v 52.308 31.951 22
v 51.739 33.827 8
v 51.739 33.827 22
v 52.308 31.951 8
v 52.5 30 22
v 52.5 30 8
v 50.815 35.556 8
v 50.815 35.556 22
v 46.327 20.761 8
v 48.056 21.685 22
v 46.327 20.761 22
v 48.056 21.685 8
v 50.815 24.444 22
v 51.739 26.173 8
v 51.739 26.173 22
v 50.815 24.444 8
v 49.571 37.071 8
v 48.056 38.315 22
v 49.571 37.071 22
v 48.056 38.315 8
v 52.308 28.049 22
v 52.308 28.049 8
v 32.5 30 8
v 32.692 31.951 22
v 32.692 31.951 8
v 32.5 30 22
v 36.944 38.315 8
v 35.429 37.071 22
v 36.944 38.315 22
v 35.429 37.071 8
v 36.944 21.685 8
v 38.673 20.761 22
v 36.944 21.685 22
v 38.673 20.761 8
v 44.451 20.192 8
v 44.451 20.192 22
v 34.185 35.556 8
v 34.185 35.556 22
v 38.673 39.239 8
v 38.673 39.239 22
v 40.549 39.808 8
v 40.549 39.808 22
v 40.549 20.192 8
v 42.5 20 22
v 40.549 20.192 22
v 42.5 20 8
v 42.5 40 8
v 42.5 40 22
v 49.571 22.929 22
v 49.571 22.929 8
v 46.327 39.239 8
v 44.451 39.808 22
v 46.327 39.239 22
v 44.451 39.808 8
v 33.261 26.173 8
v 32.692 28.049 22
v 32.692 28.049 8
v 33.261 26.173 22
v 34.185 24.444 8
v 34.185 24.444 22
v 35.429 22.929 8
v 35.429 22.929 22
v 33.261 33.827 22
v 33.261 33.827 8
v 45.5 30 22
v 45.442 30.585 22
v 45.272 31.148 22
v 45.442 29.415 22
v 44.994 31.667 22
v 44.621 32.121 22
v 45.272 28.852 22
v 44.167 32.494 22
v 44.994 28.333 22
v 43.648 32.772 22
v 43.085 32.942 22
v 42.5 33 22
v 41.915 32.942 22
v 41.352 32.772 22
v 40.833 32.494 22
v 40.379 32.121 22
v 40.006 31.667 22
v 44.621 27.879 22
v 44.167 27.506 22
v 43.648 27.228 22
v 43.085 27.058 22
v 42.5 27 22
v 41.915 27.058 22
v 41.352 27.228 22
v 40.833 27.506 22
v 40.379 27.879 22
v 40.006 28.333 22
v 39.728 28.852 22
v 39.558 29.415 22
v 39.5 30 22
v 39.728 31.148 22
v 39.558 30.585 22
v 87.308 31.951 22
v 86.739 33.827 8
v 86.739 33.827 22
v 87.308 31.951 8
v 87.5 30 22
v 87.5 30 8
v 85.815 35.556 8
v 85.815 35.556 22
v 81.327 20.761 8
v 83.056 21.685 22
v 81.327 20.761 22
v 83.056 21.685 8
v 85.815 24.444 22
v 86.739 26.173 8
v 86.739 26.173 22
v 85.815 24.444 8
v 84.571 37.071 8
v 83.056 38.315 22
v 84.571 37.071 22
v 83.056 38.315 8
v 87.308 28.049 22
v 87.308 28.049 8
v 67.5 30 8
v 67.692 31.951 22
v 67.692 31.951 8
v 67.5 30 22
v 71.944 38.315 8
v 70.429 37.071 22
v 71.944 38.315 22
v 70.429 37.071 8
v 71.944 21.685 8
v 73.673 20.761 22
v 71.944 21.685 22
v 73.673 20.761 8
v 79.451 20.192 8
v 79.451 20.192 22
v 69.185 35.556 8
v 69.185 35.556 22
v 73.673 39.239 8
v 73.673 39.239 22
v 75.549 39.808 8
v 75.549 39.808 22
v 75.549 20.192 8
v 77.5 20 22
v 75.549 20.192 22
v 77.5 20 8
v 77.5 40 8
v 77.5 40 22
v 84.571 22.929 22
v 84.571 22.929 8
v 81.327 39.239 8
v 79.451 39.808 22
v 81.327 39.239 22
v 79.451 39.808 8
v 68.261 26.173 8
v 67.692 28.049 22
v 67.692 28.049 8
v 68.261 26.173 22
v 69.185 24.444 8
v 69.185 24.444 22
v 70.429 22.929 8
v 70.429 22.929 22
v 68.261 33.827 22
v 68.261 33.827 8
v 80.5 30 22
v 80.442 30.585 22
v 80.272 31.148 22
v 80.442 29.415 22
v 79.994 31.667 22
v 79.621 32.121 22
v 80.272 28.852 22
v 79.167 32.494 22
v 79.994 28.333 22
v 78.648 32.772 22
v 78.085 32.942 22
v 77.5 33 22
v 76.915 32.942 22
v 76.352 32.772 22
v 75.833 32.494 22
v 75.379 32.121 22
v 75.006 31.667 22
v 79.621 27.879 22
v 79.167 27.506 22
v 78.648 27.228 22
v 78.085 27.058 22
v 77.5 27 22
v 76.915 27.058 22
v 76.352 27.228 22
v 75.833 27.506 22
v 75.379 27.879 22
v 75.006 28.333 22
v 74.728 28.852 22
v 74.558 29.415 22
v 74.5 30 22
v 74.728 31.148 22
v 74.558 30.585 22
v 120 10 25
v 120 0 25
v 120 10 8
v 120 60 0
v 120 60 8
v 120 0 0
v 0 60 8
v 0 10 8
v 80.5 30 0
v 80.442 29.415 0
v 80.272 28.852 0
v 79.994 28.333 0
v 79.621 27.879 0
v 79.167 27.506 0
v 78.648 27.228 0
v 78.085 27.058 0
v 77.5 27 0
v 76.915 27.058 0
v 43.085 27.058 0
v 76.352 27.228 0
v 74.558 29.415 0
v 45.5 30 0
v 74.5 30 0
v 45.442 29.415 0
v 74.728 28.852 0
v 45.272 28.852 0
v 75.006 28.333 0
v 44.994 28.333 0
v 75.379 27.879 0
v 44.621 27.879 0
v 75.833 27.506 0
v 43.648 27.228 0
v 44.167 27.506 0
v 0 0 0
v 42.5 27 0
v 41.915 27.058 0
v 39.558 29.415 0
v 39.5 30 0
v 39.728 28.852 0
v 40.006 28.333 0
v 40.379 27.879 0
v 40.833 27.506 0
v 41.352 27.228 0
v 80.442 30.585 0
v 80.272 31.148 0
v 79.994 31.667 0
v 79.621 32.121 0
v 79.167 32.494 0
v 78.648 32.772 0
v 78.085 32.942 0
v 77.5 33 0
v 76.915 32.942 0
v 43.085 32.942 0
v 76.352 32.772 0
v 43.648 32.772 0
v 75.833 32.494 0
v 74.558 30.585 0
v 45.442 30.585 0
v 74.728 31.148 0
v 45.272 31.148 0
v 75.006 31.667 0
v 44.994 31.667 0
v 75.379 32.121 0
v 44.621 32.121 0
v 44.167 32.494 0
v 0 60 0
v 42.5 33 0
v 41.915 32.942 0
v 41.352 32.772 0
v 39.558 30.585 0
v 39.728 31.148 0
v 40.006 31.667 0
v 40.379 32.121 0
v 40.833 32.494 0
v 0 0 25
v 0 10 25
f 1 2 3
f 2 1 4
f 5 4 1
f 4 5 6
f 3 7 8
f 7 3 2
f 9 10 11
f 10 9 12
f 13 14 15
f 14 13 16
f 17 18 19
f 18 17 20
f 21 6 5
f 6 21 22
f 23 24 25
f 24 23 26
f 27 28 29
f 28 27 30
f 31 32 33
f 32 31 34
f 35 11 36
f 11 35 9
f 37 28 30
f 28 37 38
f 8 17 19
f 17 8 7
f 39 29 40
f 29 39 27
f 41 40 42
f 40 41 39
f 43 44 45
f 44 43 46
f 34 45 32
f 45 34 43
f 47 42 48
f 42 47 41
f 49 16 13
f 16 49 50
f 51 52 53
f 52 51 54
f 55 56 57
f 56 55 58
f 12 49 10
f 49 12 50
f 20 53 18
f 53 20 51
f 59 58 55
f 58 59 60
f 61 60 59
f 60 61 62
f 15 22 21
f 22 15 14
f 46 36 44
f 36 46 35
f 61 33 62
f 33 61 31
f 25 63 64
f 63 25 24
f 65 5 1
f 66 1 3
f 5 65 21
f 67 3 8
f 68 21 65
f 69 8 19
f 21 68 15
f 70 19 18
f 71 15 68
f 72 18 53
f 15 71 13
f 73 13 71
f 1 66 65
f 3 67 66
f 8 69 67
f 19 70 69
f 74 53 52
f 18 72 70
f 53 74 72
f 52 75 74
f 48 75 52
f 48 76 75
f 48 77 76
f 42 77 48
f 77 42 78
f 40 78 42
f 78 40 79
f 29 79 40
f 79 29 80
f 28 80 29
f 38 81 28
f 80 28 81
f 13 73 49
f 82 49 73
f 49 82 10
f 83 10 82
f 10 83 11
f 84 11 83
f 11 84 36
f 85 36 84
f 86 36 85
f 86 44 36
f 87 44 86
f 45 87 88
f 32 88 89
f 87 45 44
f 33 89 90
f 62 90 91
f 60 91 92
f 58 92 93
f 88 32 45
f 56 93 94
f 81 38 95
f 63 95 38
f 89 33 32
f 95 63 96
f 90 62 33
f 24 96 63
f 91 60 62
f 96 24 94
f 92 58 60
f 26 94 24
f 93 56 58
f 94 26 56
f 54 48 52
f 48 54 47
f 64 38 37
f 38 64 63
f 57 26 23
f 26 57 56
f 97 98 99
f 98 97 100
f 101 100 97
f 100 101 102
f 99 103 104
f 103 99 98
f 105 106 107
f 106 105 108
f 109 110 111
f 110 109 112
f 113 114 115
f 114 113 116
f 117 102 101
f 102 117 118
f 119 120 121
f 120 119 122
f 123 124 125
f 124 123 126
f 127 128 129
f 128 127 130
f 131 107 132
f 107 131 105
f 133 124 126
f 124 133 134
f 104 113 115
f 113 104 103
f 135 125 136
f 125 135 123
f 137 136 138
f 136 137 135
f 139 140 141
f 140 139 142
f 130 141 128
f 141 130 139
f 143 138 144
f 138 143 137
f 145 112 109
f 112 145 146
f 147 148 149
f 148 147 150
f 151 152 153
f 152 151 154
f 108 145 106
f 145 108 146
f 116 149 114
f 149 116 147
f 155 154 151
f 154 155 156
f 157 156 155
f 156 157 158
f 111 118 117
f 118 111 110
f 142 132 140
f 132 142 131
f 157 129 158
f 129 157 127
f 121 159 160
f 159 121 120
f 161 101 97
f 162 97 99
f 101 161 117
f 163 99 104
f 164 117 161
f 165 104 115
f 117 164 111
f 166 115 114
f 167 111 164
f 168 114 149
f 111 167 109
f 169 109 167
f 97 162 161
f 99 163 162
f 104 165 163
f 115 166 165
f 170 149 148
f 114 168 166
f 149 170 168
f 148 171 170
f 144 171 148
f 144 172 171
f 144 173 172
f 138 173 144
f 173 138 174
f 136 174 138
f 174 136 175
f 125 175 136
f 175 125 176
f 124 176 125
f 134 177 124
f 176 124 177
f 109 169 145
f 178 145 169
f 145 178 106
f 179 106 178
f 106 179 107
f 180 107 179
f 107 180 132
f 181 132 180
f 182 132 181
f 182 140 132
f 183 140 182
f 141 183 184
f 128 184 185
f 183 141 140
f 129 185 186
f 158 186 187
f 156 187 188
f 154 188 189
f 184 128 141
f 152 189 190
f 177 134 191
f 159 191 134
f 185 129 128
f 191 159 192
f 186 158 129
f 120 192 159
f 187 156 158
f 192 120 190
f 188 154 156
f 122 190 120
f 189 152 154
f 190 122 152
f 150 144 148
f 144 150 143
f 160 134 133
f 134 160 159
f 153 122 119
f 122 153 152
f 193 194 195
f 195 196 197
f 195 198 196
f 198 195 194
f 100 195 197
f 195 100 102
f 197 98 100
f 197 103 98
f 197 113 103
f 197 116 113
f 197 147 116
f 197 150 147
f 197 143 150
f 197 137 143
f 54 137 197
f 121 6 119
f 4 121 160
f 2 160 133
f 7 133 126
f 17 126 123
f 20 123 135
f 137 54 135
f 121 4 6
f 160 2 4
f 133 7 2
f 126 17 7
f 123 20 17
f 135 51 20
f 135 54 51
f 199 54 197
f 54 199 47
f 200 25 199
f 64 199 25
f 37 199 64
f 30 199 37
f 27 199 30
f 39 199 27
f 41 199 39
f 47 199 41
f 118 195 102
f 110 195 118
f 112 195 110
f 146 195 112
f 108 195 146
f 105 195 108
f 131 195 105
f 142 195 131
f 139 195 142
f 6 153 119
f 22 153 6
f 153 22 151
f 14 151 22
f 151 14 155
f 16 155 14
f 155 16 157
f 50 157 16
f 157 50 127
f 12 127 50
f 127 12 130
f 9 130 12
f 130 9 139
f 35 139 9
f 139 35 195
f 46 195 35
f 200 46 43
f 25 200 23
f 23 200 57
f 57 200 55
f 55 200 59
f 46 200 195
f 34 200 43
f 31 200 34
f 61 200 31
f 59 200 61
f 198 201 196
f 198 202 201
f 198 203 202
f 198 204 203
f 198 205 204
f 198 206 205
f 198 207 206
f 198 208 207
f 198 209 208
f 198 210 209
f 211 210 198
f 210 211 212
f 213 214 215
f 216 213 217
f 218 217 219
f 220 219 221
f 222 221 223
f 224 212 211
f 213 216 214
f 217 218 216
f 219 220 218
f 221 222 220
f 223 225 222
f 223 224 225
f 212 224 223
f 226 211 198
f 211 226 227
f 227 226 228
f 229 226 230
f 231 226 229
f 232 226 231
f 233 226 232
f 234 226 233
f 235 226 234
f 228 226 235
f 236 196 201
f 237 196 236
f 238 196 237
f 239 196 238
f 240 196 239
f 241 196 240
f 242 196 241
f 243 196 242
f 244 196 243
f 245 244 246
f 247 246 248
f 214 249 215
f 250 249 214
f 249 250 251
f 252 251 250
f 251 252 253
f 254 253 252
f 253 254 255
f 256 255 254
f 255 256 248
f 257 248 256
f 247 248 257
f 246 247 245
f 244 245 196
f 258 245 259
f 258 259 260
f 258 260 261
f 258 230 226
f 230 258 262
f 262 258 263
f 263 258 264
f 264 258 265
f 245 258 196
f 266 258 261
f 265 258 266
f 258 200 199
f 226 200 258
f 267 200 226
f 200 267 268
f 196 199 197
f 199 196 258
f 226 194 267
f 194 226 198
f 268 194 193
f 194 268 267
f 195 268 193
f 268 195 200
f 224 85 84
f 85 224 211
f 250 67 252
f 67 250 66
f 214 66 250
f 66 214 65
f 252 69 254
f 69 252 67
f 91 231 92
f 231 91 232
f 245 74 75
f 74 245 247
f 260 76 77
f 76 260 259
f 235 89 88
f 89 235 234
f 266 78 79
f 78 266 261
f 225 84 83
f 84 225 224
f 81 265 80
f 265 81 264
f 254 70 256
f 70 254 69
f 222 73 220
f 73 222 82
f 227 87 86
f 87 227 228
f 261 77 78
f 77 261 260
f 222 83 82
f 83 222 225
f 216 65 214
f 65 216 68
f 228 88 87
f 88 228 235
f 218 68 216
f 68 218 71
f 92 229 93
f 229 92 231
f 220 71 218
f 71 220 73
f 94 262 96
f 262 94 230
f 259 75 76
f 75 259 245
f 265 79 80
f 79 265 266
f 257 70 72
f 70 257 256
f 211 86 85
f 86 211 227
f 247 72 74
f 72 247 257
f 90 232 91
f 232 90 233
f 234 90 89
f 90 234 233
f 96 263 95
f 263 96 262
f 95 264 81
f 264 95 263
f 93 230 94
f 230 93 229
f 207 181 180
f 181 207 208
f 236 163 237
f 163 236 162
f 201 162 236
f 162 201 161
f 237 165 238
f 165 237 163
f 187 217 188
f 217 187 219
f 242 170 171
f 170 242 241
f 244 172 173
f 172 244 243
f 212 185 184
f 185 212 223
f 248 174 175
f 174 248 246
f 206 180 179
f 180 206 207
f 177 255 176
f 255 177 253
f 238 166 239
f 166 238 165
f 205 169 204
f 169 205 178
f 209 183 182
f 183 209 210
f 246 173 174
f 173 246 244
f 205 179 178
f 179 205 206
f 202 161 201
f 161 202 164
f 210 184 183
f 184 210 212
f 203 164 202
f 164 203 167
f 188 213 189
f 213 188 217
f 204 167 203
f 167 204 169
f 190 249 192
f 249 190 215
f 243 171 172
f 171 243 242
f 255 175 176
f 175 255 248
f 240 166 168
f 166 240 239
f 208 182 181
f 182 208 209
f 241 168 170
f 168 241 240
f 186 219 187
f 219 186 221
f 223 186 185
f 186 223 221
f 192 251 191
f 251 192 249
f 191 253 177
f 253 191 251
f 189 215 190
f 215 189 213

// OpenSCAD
$fn = 32;

// ----------------------------------------------------------------------
// Drill jig: fence jig
// ----------------------------------------------------------------------

// --- parameters (mm) ---
plate_l = 120;            // plate length, X
plate_w = 60;             // plate width, Y
plate_t = 8;              // plate thickness
boss_d = 20;              // guide boss diameter
boss_h = 15;              // boss height above the plate
guide_d = 6;              // guide hole diameter
boss_pitch = 35;          // boss pitch
fence_h = 18;             // fence height above the plate
fence_t = 10;             // fence thickness

n_boss = 2;  // guide bosses
boss_x0 = (plate_l - (n_boss - 1) * boss_pitch) / 2;  // first boss X
boss_top = plate_t - 1 + boss_h;  // boss crown height
fence_top = plate_t - 1 + fence_h;  // fence crown height
total_h = max([fence_top, boss_top]);  // overall height

difference() {
  union() {
  cube([plate_l, plate_w, plate_t]);
  for (i = [0 : n_boss - 1])
    translate([boss_x0 + i * boss_pitch, plate_w / 2, plate_t - 1])
      cylinder(h = boss_h, d = boss_d);
  translate([0, 0, plate_t - 1]) cube([plate_l, fence_t, fence_h]);
  }
  for (i = [0 : n_boss - 1])
    translate([boss_x0 + i * boss_pitch, plate_w / 2, -1])
      cylinder(h = plate_t + boss_h, d = guide_d);
}
